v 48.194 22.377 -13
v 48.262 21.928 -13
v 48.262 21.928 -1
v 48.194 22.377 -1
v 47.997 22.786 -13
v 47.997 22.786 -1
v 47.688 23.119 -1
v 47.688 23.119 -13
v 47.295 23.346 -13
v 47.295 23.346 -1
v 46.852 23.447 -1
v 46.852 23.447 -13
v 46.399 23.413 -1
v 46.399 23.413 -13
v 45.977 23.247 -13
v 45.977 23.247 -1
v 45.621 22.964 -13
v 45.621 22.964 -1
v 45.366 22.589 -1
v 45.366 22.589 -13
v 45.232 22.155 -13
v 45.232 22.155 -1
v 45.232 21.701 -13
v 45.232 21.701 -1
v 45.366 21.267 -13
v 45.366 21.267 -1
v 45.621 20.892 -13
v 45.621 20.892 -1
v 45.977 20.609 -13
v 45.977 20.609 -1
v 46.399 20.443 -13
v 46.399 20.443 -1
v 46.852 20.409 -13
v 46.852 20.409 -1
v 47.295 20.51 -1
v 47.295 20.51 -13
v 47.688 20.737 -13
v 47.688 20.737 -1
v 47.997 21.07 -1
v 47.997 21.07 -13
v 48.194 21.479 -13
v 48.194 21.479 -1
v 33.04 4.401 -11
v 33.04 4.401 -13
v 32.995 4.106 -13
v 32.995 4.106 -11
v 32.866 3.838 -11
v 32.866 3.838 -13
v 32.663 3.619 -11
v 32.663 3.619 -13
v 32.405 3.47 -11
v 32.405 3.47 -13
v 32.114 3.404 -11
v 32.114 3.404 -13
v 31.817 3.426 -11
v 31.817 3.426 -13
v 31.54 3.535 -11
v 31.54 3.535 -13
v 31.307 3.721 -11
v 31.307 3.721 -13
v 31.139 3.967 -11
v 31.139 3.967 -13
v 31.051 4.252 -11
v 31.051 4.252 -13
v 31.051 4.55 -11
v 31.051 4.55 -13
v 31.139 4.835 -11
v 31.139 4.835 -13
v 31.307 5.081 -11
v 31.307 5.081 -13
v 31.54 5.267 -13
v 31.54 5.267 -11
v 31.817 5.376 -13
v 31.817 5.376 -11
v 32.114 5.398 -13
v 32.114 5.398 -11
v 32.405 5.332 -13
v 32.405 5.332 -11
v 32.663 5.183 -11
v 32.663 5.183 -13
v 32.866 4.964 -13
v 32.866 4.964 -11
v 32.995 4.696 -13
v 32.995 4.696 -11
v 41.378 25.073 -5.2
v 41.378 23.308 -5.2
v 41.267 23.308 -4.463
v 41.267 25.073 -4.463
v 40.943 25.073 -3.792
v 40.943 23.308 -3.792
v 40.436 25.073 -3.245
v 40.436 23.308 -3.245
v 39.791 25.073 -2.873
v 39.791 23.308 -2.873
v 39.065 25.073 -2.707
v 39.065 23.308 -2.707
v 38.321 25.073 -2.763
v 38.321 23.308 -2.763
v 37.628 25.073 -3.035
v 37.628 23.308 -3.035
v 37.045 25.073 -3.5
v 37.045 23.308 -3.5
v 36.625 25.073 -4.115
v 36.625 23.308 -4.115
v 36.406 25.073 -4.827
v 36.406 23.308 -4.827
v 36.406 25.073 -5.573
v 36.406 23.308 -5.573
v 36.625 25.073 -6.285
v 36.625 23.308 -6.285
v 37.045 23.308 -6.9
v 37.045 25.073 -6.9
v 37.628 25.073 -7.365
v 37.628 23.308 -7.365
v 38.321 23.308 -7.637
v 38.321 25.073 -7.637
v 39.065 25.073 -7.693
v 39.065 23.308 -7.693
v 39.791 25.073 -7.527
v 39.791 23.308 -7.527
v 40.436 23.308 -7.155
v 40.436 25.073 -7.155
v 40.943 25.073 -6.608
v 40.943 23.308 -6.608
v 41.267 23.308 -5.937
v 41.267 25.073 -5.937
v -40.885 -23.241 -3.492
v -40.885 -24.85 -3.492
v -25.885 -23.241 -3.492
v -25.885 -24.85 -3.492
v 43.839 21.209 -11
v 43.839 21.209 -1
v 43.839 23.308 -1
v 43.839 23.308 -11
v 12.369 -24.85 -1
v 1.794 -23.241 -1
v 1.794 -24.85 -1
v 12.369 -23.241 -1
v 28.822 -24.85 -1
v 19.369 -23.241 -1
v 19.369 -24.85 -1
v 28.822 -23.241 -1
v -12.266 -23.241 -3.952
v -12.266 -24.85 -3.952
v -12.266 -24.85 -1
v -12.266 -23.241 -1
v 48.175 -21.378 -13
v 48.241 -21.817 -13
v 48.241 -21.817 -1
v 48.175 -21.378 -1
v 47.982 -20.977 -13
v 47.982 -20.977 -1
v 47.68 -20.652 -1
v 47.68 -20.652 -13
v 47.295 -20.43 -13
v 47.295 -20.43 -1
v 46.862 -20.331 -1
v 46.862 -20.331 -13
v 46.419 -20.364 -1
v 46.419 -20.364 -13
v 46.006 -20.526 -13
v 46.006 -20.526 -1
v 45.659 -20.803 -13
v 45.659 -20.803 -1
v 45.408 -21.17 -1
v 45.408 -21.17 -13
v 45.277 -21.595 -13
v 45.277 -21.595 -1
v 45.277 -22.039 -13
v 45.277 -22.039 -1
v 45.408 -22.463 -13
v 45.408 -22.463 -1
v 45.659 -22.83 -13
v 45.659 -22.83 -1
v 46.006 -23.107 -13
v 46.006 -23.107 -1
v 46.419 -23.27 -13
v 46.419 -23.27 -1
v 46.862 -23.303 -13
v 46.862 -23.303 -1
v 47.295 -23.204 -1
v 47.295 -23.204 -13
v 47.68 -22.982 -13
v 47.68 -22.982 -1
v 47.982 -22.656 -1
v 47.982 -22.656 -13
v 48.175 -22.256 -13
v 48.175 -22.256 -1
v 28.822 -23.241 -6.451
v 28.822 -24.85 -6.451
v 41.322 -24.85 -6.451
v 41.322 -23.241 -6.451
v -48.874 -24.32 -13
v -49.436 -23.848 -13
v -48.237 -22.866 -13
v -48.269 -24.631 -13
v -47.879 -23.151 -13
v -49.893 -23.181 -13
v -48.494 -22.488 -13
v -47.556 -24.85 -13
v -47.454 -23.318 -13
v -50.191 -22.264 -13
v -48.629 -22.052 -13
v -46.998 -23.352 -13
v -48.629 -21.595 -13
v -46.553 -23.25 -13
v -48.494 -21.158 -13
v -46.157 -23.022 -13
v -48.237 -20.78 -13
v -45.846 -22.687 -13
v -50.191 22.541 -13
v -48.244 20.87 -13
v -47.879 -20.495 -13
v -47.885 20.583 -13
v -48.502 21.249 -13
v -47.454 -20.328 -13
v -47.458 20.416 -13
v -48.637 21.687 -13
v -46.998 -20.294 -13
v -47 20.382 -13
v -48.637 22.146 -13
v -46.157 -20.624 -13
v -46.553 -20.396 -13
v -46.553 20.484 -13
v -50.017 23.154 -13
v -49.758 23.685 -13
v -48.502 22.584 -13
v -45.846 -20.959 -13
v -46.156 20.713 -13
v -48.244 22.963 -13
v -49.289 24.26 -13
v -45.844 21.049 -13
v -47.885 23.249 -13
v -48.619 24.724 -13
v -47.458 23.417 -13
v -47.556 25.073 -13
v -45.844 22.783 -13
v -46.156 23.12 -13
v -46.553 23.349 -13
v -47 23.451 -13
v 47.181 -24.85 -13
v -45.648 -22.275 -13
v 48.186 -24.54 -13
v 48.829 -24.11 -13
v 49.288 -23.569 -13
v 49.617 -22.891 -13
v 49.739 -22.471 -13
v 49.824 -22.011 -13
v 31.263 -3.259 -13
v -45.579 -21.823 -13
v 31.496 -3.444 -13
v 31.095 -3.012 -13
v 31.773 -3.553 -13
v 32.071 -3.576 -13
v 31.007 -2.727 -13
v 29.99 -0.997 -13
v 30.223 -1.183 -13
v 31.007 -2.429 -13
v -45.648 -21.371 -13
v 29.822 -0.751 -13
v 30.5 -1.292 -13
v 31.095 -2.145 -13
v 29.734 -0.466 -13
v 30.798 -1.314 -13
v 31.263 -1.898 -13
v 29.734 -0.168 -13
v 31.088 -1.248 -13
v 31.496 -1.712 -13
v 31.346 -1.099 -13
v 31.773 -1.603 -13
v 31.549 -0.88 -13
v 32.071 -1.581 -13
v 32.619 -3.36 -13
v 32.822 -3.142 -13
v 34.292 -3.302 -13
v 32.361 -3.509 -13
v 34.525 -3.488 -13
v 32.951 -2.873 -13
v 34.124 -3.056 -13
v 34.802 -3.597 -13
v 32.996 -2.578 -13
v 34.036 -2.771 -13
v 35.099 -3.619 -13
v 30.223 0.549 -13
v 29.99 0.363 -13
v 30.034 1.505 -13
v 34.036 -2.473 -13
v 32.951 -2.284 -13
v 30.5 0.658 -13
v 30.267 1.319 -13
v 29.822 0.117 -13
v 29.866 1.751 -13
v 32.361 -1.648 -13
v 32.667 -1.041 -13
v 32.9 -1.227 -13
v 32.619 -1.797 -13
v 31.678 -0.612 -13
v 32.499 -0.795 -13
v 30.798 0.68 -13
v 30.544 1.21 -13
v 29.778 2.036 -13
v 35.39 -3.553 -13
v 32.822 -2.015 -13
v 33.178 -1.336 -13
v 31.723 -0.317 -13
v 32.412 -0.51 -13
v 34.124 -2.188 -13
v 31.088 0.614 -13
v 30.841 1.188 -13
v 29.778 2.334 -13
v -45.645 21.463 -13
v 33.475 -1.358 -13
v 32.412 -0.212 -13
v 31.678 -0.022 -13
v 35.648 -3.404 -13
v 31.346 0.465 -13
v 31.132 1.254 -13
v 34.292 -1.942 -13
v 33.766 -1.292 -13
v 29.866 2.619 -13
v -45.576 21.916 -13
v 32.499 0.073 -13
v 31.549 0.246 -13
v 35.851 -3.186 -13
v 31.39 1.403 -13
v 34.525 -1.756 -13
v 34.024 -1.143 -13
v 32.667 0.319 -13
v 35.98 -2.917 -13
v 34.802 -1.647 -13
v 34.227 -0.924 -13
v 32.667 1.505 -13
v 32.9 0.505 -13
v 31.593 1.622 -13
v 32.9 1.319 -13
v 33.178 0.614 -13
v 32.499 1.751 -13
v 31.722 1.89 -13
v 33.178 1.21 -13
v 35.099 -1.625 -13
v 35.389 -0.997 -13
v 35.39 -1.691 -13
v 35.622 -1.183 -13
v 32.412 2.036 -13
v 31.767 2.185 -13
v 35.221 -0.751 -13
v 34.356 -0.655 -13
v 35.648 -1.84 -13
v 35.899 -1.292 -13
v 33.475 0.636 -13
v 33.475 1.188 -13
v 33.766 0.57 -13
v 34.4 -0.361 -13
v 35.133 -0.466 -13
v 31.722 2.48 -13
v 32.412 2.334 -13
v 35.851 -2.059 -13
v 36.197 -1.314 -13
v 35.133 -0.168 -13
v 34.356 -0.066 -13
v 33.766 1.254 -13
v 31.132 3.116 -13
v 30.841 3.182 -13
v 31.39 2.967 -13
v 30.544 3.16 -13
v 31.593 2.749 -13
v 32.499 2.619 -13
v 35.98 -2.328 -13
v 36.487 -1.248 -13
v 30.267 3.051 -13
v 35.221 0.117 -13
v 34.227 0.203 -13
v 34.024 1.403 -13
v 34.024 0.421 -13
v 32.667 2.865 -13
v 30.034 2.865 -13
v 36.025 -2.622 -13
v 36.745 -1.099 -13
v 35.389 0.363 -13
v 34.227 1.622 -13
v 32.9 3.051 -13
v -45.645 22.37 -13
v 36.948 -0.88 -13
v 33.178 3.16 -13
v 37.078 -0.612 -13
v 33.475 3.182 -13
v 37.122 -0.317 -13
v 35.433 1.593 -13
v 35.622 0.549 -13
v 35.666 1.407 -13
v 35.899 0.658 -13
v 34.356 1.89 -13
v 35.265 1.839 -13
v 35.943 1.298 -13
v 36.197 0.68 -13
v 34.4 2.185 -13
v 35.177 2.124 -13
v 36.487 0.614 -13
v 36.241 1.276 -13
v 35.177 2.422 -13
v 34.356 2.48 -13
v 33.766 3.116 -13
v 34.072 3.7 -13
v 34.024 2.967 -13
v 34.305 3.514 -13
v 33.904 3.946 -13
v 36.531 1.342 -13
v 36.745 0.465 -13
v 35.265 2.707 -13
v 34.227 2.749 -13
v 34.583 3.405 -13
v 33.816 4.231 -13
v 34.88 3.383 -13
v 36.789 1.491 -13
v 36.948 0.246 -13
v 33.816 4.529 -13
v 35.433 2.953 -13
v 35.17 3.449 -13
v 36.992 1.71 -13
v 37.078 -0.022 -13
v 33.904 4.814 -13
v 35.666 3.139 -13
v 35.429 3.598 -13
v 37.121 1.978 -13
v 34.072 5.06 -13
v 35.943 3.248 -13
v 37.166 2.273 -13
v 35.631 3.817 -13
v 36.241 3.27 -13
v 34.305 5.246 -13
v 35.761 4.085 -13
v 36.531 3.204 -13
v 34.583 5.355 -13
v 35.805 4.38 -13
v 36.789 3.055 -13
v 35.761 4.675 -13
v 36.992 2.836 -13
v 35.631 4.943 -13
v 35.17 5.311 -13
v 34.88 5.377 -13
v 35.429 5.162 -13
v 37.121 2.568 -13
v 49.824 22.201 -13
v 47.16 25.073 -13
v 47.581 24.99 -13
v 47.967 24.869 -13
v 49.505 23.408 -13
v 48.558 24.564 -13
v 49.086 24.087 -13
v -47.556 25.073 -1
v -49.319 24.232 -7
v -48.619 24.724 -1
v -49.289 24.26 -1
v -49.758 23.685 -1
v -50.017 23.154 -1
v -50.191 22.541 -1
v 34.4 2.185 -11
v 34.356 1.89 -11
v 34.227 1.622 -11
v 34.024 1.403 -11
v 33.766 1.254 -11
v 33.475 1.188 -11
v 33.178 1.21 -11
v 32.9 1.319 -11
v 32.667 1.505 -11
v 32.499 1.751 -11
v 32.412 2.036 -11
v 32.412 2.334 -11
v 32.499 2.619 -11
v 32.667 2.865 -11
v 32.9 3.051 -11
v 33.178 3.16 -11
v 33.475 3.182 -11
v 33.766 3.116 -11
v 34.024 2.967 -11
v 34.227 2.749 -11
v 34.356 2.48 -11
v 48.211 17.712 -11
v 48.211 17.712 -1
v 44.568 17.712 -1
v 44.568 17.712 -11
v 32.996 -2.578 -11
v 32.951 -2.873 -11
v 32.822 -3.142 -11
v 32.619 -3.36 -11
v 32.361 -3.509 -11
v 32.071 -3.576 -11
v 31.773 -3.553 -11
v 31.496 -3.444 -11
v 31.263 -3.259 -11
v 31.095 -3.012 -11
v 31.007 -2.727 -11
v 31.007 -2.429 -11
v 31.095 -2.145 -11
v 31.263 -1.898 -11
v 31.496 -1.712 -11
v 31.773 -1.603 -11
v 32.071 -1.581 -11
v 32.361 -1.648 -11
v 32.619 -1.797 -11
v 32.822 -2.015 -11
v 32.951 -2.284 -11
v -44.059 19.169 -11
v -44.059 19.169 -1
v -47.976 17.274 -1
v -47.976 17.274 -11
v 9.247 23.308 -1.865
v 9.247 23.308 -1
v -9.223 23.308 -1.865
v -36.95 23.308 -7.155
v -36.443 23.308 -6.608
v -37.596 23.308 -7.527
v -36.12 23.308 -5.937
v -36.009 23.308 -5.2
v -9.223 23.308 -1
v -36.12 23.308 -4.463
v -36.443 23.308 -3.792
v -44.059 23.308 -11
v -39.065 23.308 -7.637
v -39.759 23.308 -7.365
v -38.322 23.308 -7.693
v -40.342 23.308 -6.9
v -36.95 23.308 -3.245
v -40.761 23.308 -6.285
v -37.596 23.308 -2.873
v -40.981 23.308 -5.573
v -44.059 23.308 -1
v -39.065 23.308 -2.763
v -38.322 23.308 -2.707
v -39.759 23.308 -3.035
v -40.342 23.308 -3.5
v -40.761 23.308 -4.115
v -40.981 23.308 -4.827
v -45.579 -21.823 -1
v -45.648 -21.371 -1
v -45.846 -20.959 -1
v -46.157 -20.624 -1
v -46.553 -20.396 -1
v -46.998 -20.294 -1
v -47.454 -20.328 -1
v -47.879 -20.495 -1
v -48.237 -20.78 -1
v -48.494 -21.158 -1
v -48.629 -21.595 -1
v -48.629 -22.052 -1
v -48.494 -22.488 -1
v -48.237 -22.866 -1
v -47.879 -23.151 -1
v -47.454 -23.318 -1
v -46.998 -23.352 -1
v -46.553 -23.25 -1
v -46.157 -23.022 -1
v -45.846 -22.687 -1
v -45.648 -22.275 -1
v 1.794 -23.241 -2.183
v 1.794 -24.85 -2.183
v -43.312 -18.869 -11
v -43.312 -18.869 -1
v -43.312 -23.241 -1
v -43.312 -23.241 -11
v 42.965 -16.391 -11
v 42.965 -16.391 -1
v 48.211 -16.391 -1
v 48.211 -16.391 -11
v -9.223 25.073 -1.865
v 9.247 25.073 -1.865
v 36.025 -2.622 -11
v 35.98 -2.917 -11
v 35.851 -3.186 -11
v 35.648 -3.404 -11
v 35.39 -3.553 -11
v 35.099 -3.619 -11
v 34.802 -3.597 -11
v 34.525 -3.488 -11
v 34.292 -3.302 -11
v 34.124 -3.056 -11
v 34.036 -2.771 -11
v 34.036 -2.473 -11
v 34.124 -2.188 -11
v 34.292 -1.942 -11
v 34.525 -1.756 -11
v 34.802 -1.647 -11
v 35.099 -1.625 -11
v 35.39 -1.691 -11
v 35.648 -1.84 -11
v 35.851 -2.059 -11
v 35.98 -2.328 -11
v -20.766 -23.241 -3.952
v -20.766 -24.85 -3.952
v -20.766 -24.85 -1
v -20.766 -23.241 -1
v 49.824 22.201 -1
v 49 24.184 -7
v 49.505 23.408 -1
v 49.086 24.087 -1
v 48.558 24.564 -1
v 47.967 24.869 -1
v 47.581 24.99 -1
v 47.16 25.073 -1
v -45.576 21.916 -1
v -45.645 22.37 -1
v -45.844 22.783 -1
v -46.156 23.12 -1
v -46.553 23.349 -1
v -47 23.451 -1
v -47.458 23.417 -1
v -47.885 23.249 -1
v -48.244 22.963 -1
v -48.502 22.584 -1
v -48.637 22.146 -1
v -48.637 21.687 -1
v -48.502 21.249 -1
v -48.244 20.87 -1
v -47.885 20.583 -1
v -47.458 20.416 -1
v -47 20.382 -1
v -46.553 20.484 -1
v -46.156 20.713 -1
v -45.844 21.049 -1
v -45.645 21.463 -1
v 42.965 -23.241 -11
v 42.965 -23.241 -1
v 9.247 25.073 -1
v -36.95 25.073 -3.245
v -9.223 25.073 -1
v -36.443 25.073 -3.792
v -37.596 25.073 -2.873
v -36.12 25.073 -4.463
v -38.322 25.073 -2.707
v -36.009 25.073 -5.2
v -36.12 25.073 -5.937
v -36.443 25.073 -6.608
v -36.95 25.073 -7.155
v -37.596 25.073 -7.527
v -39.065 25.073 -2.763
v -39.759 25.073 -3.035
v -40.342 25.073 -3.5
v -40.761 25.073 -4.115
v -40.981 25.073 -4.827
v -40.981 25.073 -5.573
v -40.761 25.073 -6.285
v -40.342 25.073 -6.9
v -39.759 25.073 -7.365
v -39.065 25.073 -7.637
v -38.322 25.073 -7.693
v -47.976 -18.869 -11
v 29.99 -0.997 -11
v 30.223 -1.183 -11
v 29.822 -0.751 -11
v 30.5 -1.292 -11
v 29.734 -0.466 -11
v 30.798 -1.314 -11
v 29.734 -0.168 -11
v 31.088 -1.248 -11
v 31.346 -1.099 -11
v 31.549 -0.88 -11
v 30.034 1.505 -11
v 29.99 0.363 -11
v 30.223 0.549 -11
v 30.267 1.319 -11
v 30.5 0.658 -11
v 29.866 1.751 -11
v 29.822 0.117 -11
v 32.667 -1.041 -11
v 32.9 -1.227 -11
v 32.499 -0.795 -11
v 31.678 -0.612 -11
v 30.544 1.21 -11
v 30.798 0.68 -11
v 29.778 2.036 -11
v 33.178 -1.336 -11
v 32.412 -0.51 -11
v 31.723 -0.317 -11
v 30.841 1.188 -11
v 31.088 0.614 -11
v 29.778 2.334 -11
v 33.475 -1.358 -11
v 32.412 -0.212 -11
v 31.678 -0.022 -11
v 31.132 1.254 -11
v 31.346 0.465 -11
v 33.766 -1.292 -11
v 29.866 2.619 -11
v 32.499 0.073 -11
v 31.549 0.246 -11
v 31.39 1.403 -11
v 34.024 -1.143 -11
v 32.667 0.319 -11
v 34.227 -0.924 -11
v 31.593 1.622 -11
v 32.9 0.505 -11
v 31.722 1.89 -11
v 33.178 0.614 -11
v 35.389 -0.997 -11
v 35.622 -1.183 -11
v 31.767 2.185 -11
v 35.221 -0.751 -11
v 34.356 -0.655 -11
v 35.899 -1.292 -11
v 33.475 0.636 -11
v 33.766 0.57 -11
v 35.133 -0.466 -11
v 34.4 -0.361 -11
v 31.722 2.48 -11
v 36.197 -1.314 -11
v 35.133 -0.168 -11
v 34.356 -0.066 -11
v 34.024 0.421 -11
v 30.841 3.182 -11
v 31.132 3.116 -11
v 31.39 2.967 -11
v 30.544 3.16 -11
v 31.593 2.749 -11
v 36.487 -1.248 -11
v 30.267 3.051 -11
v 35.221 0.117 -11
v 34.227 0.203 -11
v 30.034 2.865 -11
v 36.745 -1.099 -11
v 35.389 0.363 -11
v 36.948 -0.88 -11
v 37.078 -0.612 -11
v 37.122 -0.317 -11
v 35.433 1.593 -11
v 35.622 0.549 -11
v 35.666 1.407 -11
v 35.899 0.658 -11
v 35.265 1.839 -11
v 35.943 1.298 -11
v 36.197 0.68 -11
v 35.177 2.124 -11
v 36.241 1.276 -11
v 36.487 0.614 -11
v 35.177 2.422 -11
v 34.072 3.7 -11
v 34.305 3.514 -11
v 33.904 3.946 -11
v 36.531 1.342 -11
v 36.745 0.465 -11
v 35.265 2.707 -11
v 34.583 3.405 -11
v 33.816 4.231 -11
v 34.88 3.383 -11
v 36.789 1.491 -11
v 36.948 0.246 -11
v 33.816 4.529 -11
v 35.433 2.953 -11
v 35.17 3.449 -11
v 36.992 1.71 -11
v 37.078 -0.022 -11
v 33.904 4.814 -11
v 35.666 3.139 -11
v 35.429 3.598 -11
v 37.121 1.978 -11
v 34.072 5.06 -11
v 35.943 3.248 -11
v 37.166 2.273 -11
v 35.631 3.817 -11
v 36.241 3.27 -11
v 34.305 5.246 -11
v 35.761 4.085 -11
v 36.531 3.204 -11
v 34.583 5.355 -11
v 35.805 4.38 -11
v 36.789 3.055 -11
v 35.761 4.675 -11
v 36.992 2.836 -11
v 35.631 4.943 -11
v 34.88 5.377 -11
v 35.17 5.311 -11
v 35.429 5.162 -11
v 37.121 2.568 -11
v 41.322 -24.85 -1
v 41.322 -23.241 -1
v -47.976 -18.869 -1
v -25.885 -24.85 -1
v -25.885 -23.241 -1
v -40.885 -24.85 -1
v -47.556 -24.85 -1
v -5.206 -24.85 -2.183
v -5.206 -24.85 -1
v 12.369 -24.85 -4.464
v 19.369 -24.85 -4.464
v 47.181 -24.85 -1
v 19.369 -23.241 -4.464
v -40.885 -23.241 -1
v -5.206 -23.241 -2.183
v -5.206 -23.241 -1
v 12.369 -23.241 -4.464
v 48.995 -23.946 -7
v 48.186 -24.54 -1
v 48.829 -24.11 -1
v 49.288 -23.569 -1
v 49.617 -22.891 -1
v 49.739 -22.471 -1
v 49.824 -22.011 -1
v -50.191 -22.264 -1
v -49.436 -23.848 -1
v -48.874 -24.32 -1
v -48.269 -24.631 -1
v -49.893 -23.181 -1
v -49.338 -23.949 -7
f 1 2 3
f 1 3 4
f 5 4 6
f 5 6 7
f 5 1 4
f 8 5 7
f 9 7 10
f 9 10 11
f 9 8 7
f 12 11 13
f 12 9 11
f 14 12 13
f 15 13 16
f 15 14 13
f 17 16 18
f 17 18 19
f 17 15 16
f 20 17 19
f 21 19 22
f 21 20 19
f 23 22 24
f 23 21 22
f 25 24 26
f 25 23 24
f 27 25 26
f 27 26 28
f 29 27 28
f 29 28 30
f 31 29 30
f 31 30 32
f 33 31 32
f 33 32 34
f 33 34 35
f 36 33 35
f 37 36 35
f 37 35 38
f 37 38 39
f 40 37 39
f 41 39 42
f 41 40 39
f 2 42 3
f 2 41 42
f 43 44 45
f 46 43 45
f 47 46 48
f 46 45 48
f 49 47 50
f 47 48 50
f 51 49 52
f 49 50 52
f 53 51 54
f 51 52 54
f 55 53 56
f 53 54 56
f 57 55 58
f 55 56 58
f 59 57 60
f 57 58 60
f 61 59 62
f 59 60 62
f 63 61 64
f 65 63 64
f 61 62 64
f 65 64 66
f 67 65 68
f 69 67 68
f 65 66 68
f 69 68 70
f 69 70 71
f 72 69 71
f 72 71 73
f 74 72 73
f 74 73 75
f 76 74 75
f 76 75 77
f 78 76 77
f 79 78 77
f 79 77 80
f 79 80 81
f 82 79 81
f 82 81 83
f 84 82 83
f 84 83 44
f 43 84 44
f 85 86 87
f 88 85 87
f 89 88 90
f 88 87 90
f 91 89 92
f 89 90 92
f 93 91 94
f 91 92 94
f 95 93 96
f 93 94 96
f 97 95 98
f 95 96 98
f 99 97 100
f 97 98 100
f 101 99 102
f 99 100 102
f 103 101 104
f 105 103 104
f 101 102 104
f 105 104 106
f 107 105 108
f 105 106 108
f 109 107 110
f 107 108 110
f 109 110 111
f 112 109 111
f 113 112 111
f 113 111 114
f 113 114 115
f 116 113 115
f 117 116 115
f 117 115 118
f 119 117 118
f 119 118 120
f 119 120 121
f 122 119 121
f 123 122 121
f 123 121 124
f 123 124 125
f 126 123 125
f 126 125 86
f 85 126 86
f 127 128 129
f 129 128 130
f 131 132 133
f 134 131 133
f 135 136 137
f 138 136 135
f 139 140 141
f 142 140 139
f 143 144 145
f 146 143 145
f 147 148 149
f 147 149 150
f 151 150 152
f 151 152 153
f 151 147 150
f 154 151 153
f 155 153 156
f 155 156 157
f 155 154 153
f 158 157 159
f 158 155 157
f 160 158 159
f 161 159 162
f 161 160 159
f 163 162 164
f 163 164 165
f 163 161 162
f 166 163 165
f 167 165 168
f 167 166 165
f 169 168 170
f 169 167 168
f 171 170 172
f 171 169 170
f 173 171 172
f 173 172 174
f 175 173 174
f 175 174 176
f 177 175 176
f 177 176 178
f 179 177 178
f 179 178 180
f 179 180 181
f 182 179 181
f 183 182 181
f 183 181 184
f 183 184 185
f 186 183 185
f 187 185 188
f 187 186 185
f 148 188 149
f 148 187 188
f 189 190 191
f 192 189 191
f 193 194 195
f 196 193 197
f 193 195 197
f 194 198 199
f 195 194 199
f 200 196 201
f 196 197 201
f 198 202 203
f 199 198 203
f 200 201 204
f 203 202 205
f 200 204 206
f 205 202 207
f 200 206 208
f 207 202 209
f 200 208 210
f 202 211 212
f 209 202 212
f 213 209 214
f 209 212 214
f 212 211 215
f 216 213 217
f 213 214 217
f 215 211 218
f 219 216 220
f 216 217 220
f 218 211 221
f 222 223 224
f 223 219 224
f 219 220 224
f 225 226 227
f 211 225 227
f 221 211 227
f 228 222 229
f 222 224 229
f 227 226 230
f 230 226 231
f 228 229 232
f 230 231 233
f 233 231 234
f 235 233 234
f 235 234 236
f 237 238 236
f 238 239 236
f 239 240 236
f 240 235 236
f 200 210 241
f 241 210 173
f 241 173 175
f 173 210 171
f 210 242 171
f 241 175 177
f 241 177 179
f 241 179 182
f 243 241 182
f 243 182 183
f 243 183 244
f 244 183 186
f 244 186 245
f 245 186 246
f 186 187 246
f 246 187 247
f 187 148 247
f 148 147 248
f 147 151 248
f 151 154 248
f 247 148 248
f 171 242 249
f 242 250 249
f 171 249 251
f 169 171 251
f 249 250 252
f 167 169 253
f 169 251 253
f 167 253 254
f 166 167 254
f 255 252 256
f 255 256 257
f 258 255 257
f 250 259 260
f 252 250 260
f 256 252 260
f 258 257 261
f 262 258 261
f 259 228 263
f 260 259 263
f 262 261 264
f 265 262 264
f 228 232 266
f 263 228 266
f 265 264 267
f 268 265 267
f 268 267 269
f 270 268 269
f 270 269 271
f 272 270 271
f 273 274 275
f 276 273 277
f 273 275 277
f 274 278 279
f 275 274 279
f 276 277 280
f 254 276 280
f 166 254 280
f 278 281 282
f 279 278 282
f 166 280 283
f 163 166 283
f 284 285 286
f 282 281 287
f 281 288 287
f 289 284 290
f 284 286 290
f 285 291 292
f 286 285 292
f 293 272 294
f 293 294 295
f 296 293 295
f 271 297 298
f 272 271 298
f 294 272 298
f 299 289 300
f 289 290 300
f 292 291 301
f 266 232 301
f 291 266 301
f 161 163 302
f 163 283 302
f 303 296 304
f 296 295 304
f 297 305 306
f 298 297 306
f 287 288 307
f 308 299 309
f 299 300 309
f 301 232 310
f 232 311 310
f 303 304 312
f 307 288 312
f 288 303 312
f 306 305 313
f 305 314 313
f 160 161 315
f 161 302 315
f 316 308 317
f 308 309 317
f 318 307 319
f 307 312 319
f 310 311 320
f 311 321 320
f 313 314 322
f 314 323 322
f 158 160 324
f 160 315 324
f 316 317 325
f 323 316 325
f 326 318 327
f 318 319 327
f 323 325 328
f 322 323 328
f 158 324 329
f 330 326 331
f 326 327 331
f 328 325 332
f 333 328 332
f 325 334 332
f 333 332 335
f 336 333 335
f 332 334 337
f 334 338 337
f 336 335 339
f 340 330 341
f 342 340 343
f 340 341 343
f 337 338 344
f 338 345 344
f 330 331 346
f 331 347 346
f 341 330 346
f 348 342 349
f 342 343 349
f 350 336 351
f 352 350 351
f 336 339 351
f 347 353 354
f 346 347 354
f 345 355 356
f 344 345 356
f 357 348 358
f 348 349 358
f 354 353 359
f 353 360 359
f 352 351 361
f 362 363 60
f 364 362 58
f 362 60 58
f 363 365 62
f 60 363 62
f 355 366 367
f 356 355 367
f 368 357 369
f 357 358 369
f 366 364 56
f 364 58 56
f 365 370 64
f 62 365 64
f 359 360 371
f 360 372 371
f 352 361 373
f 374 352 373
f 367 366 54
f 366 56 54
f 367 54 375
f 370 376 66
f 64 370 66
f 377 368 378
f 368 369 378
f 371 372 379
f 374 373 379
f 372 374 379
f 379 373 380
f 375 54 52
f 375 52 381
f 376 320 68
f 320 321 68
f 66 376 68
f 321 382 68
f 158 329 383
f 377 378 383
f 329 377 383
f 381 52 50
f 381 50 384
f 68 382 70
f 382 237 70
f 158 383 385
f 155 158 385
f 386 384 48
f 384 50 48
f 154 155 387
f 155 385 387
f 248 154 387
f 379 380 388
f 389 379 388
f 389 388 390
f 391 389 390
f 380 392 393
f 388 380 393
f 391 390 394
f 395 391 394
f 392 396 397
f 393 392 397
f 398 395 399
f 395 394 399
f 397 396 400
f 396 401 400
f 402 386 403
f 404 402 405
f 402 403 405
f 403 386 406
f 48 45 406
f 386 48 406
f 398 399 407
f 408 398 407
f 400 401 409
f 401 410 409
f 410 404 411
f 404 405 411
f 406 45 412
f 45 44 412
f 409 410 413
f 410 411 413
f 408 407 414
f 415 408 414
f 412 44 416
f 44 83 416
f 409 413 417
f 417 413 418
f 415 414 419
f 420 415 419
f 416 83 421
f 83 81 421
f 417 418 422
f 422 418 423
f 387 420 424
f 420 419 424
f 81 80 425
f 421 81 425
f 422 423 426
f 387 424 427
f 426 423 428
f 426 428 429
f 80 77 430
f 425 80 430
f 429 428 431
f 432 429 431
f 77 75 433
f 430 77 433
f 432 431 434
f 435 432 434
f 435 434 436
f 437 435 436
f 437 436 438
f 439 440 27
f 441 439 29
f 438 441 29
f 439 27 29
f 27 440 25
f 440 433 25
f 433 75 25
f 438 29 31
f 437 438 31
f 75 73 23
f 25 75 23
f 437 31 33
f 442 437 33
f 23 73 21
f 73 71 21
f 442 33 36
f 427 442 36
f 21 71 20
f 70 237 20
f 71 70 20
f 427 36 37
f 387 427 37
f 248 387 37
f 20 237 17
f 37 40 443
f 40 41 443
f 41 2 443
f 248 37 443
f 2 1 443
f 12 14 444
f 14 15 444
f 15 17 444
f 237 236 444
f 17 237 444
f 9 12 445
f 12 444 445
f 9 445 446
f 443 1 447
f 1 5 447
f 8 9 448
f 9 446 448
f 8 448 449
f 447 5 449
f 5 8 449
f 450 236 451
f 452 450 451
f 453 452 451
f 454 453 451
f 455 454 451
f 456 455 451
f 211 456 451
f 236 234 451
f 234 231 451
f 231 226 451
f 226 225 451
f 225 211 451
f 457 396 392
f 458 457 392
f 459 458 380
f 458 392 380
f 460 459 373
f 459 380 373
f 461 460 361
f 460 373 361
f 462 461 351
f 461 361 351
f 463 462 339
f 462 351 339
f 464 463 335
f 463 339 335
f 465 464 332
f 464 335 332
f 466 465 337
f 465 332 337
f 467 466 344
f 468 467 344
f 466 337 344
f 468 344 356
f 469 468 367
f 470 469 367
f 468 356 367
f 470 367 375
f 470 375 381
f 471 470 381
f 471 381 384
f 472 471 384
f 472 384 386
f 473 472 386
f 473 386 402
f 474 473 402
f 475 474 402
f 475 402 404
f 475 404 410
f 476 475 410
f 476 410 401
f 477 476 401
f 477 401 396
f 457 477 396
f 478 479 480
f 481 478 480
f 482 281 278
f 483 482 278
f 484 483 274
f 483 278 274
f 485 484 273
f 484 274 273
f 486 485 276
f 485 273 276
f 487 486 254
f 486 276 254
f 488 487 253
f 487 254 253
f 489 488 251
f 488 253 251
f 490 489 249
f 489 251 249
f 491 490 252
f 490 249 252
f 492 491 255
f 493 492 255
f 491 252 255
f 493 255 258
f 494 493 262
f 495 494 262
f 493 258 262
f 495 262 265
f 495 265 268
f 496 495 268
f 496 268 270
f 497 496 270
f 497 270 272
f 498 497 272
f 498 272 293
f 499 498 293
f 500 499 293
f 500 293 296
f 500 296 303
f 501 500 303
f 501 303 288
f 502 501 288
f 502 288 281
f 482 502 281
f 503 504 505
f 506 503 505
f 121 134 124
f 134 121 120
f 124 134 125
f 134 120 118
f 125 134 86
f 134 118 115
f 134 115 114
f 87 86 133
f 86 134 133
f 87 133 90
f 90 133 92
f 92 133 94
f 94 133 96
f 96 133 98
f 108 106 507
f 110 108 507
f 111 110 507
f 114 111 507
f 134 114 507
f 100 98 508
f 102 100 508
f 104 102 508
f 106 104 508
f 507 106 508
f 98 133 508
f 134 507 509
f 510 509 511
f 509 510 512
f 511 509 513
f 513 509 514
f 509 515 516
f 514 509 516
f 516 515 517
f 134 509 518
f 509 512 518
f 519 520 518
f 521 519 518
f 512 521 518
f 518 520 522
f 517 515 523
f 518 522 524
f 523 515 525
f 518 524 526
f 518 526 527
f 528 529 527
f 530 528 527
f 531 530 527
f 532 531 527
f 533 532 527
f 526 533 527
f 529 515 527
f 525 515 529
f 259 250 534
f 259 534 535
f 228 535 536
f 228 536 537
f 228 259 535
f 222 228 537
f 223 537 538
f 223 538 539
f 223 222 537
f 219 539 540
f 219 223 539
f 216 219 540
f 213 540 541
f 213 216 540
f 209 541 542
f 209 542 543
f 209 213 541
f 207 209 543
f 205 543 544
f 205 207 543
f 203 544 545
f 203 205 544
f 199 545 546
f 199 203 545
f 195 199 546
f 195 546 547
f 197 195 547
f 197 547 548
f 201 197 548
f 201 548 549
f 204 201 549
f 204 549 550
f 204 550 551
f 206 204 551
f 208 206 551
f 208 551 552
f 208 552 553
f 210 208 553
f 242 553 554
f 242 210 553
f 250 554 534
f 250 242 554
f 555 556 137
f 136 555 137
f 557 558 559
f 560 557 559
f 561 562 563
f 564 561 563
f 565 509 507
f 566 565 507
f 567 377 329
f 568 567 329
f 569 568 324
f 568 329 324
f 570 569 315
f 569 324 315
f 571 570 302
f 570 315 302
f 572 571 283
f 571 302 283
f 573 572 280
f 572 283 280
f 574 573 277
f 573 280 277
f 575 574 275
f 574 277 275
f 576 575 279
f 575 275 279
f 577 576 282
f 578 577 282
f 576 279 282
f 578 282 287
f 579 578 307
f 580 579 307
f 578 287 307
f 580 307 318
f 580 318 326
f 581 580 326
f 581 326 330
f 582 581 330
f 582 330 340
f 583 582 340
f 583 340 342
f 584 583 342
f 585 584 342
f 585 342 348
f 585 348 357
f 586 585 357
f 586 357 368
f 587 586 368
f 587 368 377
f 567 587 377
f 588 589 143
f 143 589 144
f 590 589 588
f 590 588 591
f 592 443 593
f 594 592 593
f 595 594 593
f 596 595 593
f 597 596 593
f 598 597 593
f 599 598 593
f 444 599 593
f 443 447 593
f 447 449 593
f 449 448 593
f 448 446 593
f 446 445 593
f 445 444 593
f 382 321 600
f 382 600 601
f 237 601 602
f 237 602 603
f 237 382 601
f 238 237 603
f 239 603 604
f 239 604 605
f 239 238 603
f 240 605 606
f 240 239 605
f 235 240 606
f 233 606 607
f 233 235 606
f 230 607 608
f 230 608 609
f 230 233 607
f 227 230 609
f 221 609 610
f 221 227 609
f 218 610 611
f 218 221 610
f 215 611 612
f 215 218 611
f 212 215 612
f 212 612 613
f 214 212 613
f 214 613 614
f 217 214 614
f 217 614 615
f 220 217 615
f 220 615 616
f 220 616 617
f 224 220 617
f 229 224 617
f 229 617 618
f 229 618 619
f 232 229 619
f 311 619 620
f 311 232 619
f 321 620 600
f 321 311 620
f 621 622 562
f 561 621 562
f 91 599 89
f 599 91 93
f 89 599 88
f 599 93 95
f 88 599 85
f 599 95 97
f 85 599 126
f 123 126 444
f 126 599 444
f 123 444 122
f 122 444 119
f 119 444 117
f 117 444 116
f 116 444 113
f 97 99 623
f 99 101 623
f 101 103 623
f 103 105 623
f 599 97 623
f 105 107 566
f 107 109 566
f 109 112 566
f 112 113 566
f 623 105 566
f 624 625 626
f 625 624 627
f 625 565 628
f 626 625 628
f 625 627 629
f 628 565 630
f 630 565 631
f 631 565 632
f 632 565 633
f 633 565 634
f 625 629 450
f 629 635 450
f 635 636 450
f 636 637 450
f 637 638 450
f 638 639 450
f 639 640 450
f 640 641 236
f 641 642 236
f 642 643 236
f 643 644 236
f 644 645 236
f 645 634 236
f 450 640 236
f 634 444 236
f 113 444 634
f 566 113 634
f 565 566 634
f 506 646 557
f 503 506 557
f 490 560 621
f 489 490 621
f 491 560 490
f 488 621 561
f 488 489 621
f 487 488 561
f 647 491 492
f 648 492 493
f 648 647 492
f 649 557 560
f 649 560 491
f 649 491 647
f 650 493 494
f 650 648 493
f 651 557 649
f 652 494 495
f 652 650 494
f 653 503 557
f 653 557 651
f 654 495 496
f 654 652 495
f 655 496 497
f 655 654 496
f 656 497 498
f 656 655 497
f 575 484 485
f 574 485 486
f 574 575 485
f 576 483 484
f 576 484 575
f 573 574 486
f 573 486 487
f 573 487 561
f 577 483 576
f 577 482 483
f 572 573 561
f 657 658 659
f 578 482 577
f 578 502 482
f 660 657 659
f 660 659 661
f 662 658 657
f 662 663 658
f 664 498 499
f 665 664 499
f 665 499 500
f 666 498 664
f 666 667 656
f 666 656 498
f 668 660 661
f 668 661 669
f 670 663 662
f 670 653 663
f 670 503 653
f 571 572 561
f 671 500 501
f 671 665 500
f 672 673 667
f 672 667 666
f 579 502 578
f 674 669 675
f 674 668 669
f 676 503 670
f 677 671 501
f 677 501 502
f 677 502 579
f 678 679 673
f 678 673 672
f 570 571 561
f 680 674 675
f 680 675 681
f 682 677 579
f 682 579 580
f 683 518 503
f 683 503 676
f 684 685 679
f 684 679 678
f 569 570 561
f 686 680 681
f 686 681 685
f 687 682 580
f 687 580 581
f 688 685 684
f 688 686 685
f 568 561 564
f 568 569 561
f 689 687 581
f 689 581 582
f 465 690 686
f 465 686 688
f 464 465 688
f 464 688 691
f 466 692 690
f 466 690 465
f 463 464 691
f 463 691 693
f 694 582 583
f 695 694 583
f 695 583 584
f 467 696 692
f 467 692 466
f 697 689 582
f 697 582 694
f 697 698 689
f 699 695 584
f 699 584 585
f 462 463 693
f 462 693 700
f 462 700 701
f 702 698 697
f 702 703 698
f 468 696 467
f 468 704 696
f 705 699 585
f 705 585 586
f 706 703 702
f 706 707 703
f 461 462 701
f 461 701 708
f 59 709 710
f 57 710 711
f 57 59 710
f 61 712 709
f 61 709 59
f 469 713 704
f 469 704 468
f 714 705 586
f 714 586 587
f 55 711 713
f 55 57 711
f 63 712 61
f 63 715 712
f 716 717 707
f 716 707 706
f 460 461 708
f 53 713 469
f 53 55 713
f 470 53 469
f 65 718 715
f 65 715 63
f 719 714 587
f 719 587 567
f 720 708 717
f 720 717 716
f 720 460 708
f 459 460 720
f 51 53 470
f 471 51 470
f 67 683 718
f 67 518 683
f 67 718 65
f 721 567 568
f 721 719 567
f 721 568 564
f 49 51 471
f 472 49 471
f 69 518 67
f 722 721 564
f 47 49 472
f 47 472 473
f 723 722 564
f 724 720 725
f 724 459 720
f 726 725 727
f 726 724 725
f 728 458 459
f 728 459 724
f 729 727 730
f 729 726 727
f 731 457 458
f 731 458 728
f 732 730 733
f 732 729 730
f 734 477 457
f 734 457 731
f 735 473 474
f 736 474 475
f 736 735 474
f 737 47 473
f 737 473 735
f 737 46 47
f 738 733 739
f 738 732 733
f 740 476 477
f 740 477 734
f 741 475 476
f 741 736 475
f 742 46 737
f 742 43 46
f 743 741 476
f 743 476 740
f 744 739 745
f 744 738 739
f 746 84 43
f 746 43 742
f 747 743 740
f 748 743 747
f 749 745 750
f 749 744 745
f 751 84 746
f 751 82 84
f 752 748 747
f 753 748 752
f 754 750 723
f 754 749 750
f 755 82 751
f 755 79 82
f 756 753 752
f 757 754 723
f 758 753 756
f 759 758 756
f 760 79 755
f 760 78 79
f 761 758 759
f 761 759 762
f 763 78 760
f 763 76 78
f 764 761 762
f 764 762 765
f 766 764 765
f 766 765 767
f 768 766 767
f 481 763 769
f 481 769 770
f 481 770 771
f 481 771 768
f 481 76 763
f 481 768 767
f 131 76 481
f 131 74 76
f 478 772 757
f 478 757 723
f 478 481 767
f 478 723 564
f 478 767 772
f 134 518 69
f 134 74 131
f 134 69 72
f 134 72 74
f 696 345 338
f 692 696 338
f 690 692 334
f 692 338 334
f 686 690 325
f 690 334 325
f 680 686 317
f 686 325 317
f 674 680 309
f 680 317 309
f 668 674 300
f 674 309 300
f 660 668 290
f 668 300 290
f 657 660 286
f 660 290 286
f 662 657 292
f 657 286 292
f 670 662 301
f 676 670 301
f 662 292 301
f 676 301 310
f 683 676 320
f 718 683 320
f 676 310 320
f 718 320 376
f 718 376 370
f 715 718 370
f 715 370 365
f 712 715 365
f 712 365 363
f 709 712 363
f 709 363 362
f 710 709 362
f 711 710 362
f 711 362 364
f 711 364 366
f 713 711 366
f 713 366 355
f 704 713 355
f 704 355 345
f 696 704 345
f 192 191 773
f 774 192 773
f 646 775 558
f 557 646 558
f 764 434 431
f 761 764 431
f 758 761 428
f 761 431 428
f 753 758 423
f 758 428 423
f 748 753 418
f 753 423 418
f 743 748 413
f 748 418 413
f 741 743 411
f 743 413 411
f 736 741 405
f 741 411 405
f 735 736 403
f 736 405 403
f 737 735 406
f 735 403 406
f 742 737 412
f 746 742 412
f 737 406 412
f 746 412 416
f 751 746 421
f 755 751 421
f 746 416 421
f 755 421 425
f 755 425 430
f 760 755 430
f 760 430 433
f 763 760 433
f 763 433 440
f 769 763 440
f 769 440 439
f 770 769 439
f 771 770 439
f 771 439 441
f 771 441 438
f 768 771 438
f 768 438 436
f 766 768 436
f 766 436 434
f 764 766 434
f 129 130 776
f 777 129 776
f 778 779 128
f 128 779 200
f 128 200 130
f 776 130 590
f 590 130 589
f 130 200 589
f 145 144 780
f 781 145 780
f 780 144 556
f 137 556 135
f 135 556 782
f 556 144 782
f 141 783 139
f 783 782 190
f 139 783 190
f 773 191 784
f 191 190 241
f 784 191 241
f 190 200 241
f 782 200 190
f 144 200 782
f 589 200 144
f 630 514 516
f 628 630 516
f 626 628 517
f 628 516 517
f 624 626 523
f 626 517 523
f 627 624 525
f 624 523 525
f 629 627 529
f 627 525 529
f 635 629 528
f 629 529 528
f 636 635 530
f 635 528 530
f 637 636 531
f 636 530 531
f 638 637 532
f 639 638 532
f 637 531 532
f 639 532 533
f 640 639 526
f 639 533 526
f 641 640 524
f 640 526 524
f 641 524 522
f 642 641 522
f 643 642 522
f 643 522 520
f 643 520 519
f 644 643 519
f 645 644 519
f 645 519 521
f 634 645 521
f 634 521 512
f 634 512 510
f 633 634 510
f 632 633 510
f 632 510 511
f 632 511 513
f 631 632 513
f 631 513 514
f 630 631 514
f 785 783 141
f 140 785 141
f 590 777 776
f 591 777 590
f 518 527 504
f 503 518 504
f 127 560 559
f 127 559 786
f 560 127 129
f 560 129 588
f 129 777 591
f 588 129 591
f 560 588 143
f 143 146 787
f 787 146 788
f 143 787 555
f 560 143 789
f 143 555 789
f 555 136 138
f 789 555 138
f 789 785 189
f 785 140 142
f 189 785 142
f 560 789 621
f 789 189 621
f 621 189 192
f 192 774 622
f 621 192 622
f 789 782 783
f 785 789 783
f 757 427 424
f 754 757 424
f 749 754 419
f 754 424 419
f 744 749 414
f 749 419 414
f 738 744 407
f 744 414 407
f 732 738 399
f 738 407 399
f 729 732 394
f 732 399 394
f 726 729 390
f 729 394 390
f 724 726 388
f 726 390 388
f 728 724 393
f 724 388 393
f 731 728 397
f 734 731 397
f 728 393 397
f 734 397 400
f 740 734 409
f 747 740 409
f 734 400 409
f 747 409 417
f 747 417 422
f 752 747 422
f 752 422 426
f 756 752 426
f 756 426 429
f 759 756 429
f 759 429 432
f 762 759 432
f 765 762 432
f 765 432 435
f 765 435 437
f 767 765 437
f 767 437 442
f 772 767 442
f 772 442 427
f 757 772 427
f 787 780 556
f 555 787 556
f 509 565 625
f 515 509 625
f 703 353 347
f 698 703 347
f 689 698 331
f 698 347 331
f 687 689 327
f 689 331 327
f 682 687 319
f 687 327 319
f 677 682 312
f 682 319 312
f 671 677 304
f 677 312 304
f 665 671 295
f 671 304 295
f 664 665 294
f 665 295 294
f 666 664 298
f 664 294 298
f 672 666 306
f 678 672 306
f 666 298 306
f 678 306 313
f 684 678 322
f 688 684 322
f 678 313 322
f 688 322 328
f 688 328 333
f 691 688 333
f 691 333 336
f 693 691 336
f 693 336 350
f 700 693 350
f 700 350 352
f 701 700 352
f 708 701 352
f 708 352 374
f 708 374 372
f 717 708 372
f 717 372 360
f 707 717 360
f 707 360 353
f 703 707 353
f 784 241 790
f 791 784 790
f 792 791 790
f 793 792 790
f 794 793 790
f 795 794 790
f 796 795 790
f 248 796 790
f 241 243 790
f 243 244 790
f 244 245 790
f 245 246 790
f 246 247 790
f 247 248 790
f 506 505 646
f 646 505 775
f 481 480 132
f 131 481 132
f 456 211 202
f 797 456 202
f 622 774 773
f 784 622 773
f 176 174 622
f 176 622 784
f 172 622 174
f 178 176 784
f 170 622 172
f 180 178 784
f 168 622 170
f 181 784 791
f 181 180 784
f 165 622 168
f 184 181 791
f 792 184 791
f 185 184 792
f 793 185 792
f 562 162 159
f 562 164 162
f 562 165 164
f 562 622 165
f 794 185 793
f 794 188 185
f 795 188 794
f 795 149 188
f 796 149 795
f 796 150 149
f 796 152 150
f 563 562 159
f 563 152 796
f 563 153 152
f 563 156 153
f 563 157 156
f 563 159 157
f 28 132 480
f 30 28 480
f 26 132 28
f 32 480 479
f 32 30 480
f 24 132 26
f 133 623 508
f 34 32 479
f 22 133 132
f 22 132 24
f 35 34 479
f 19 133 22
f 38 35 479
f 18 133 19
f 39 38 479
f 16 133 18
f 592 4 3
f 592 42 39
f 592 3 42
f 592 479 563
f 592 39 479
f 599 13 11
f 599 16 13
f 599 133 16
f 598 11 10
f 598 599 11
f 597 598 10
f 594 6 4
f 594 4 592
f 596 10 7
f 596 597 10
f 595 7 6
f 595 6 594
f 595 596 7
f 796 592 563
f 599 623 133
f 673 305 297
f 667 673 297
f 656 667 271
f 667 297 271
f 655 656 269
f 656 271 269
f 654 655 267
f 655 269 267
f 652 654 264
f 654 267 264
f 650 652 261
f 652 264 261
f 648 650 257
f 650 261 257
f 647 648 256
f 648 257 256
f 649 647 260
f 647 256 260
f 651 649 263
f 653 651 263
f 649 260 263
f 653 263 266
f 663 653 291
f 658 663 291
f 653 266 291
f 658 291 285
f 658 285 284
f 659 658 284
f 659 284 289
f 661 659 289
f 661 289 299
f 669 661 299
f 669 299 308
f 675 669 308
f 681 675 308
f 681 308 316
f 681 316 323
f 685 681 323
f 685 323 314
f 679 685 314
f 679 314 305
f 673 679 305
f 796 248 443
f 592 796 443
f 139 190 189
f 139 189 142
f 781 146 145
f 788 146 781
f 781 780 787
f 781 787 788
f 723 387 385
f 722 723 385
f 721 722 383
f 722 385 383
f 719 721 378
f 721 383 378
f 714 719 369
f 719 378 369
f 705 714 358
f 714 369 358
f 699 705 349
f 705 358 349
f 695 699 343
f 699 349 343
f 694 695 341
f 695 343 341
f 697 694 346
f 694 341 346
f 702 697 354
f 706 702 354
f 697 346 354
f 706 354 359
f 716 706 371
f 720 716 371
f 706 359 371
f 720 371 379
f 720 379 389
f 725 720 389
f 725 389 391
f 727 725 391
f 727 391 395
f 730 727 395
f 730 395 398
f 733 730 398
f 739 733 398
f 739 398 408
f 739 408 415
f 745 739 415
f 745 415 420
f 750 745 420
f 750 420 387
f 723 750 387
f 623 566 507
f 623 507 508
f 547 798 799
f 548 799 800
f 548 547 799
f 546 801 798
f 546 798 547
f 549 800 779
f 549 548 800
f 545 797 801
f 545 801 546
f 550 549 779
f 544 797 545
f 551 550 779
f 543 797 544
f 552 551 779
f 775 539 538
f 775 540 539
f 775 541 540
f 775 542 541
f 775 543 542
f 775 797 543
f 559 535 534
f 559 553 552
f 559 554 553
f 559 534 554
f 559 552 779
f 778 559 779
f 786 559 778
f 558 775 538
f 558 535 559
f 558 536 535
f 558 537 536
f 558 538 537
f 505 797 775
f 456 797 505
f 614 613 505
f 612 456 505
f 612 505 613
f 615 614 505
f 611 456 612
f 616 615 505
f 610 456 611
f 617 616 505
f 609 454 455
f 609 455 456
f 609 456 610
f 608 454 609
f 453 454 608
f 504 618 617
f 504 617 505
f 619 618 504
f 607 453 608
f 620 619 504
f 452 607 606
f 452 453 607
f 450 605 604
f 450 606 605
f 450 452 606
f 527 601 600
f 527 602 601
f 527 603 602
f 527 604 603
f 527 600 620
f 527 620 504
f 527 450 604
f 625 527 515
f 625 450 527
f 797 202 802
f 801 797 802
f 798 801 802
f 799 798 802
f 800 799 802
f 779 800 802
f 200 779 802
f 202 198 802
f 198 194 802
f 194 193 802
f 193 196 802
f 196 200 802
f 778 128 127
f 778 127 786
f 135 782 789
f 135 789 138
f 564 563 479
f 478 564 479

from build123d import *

# Parameters (mm, degrees)
SKETCH008_R     = 1.539175
SKETCH008_R_2   = 1.523329
SKETCH008_R_3   = 1.533201
SKETCH008_R_4   = 1.490189
PAD006_DEPTH    = 12
POCKET002_DEPTH = 10
SKETCH010_W     = 12.5
SKETCH010_H     = 5.5
SKETCH010_W_2   = 7
SKETCH010_H_2   = 3.5
SKETCH010_H_3   = 1.2
SKETCH010_W_3   = 8.5
SKETCH010_H_4   = 3
SKETCH010_W_4   = 15
SKETCH010_H_5   = 2.5
POCKET003_DEPTH = 5
SKETCH011_R     = 2.5
SKETCH011_W     = 18.47
SKETCH011_H     = 1
POCKET004_DEPTH = 5
SKETCH012_R     = 1
POCKET005_DEPTH = 5


with BuildPart() as part:
    # Sketch008 → Pad006 (new body)
    with BuildSketch(Plane.XY):
        with BuildLine():
            add(Edge.make_bspline(
                [(49.8242, 22.201212), (49.508362, 24.731634), (47.160099, 25.0727)],
                knots=[0, 0, 0, 1, 1, 1], degree=2))
            Line((47.160099, 25.0727), (-47.5558, 25.0727))
            add(Edge.make_bspline(
                [(-47.5558, 25.0727), (-49.764992, 24.657032), (-50.191277, 22.540522)],
                knots=[0, 0, 0, 1, 1, 1], degree=2))
            Line((-50.191277, 22.540522), (-50.191277, -22.264349))
            add(Edge.make_bspline(
                [(-50.191277, -22.264349), (-49.80262, -24.340702), (-47.5557, -24.8503)],
                knots=[0, 0, 0, 1, 1, 1], degree=2))
            Line((-47.5557, -24.8503), (47.181141, -24.8503))
            add(Edge.make_bspline(
                [(47.181141, -24.8503), (49.487186, -24.462395), (49.8242, -22.0108)],
                knots=[0, 0, 0, 1, 1, 1], degree=2))
            Line((49.8242, -22.0108), (49.8242, 22.201212))
        make_face()
        with Locations((-47.115311, 21.916405)):
            Circle(SKETCH008_R, mode=Mode.SUBTRACT)
        with Locations((46.738178, 21.927752)):
            Circle(SKETCH008_R_2, mode=Mode.SUBTRACT)
        with Locations((-47.112675, -21.823126)):
            Circle(SKETCH008_R_3, mode=Mode.SUBTRACT)
        with Locations((46.75103, -21.816845)):
            Circle(SKETCH008_R_4, mode=Mode.SUBTRACT)
    extrude(amount=PAD006_DEPTH)

    # Sketch009 (on Face14 of Pad006) → Pocket002 (cut)
    with BuildSketch(Plane.XY.offset(12)):
        Polygon((-44.059395, 23.3085), (-44.059395, 19.16888), (-47.975544, 17.274294), (-47.975544, -18.868563), (-43.311943, -18.868563), (-43.311943, -23.240685), (42.964558, -23.240685), (42.964558, -16.391027), (48.211094, -16.391027), (48.211094, 17.711506), (44.567665, 17.711506), (43.838982, 21.209202), (43.838982, 23.3085), align=None)
    extrude(amount=-POCKET002_DEPTH, mode=Mode.SUBTRACT)

    # Sketch010 (on Face10 of Pocket002) → Pocket003 (cut)
    with BuildSketch(Plane.XZ.offset(24.8503)):
        with Locations((35.071653, 9.29913)):
            Rectangle(SKETCH010_W, SKETCH010_H)
        with Locations((15.86862, 10.28645)):
            Rectangle(SKETCH010_W_2, SKETCH010_H_2)
        with Locations((-1.705669, 11.417012)):
            Rectangle(SKETCH010_W_2, SKETCH010_H_3)
        with Locations((-16.516187, 10.547991)):
            Rectangle(SKETCH010_W_3, SKETCH010_H_4)
        with Locations((-33.384749, 10.757572)):
            Rectangle(SKETCH010_W_4, SKETCH010_H_5)
    extrude(amount=-POCKET003_DEPTH, mode=Mode.SUBTRACT)

    # Sketch011 (on Face23 of Pocket003) → Pocket004 (cut)
    with BuildSketch(Plane.XZ.offset(-23.3085)):
        with Locations((-38.509063, 7.8)):
            Circle(SKETCH011_R)
        with Locations((38.877759, 7.8)):
            Circle(SKETCH011_R)
        with Locations((0.011538, 11.635367)):
            Rectangle(SKETCH011_W, SKETCH011_H)
    extrude(amount=-POCKET004_DEPTH, mode=Mode.SUBTRACT)

    # Sketch012 (on Face4 of Pocket004) → Pocket005 (cut)
    with BuildSketch(Plane(origin=(0, 0, 0), x_dir=(1, 0, 0), z_dir=(0, 0, -1))):
        with Locations((34.805111, -4.37996)):
            Circle(SKETCH012_R)
        with Locations((36.121971, 0.316835)):
            Circle(SKETCH012_R)
        with Locations((30.722851, 0.316835)):
            Circle(SKETCH012_R)
        with Locations((36.165867, -2.272987)):
            Circle(SKETCH012_R)
        with Locations((33.400463, -2.185196)):
            Circle(SKETCH012_R)
        with Locations((35.02459, 2.622291)):
            Circle(SKETCH012_R)
        with Locations((31.995813, 2.578395)):
            Circle(SKETCH012_R)
        with Locations((32.039707, -4.400955)):
            Circle(SKETCH012_R)
        with Locations((30.766747, -2.185196)):
            Circle(SKETCH012_R)
        with Locations((33.400463, 0.36073)):
            Circle(SKETCH012_R)
    extrude(amount=-POCKET005_DEPTH, mode=Mode.SUBTRACT)


with BuildPart() as part_1:
    # Body003 placement: moved
    add(part.part.moved(Location((0, 0, -13))))


solid = part_1.part
